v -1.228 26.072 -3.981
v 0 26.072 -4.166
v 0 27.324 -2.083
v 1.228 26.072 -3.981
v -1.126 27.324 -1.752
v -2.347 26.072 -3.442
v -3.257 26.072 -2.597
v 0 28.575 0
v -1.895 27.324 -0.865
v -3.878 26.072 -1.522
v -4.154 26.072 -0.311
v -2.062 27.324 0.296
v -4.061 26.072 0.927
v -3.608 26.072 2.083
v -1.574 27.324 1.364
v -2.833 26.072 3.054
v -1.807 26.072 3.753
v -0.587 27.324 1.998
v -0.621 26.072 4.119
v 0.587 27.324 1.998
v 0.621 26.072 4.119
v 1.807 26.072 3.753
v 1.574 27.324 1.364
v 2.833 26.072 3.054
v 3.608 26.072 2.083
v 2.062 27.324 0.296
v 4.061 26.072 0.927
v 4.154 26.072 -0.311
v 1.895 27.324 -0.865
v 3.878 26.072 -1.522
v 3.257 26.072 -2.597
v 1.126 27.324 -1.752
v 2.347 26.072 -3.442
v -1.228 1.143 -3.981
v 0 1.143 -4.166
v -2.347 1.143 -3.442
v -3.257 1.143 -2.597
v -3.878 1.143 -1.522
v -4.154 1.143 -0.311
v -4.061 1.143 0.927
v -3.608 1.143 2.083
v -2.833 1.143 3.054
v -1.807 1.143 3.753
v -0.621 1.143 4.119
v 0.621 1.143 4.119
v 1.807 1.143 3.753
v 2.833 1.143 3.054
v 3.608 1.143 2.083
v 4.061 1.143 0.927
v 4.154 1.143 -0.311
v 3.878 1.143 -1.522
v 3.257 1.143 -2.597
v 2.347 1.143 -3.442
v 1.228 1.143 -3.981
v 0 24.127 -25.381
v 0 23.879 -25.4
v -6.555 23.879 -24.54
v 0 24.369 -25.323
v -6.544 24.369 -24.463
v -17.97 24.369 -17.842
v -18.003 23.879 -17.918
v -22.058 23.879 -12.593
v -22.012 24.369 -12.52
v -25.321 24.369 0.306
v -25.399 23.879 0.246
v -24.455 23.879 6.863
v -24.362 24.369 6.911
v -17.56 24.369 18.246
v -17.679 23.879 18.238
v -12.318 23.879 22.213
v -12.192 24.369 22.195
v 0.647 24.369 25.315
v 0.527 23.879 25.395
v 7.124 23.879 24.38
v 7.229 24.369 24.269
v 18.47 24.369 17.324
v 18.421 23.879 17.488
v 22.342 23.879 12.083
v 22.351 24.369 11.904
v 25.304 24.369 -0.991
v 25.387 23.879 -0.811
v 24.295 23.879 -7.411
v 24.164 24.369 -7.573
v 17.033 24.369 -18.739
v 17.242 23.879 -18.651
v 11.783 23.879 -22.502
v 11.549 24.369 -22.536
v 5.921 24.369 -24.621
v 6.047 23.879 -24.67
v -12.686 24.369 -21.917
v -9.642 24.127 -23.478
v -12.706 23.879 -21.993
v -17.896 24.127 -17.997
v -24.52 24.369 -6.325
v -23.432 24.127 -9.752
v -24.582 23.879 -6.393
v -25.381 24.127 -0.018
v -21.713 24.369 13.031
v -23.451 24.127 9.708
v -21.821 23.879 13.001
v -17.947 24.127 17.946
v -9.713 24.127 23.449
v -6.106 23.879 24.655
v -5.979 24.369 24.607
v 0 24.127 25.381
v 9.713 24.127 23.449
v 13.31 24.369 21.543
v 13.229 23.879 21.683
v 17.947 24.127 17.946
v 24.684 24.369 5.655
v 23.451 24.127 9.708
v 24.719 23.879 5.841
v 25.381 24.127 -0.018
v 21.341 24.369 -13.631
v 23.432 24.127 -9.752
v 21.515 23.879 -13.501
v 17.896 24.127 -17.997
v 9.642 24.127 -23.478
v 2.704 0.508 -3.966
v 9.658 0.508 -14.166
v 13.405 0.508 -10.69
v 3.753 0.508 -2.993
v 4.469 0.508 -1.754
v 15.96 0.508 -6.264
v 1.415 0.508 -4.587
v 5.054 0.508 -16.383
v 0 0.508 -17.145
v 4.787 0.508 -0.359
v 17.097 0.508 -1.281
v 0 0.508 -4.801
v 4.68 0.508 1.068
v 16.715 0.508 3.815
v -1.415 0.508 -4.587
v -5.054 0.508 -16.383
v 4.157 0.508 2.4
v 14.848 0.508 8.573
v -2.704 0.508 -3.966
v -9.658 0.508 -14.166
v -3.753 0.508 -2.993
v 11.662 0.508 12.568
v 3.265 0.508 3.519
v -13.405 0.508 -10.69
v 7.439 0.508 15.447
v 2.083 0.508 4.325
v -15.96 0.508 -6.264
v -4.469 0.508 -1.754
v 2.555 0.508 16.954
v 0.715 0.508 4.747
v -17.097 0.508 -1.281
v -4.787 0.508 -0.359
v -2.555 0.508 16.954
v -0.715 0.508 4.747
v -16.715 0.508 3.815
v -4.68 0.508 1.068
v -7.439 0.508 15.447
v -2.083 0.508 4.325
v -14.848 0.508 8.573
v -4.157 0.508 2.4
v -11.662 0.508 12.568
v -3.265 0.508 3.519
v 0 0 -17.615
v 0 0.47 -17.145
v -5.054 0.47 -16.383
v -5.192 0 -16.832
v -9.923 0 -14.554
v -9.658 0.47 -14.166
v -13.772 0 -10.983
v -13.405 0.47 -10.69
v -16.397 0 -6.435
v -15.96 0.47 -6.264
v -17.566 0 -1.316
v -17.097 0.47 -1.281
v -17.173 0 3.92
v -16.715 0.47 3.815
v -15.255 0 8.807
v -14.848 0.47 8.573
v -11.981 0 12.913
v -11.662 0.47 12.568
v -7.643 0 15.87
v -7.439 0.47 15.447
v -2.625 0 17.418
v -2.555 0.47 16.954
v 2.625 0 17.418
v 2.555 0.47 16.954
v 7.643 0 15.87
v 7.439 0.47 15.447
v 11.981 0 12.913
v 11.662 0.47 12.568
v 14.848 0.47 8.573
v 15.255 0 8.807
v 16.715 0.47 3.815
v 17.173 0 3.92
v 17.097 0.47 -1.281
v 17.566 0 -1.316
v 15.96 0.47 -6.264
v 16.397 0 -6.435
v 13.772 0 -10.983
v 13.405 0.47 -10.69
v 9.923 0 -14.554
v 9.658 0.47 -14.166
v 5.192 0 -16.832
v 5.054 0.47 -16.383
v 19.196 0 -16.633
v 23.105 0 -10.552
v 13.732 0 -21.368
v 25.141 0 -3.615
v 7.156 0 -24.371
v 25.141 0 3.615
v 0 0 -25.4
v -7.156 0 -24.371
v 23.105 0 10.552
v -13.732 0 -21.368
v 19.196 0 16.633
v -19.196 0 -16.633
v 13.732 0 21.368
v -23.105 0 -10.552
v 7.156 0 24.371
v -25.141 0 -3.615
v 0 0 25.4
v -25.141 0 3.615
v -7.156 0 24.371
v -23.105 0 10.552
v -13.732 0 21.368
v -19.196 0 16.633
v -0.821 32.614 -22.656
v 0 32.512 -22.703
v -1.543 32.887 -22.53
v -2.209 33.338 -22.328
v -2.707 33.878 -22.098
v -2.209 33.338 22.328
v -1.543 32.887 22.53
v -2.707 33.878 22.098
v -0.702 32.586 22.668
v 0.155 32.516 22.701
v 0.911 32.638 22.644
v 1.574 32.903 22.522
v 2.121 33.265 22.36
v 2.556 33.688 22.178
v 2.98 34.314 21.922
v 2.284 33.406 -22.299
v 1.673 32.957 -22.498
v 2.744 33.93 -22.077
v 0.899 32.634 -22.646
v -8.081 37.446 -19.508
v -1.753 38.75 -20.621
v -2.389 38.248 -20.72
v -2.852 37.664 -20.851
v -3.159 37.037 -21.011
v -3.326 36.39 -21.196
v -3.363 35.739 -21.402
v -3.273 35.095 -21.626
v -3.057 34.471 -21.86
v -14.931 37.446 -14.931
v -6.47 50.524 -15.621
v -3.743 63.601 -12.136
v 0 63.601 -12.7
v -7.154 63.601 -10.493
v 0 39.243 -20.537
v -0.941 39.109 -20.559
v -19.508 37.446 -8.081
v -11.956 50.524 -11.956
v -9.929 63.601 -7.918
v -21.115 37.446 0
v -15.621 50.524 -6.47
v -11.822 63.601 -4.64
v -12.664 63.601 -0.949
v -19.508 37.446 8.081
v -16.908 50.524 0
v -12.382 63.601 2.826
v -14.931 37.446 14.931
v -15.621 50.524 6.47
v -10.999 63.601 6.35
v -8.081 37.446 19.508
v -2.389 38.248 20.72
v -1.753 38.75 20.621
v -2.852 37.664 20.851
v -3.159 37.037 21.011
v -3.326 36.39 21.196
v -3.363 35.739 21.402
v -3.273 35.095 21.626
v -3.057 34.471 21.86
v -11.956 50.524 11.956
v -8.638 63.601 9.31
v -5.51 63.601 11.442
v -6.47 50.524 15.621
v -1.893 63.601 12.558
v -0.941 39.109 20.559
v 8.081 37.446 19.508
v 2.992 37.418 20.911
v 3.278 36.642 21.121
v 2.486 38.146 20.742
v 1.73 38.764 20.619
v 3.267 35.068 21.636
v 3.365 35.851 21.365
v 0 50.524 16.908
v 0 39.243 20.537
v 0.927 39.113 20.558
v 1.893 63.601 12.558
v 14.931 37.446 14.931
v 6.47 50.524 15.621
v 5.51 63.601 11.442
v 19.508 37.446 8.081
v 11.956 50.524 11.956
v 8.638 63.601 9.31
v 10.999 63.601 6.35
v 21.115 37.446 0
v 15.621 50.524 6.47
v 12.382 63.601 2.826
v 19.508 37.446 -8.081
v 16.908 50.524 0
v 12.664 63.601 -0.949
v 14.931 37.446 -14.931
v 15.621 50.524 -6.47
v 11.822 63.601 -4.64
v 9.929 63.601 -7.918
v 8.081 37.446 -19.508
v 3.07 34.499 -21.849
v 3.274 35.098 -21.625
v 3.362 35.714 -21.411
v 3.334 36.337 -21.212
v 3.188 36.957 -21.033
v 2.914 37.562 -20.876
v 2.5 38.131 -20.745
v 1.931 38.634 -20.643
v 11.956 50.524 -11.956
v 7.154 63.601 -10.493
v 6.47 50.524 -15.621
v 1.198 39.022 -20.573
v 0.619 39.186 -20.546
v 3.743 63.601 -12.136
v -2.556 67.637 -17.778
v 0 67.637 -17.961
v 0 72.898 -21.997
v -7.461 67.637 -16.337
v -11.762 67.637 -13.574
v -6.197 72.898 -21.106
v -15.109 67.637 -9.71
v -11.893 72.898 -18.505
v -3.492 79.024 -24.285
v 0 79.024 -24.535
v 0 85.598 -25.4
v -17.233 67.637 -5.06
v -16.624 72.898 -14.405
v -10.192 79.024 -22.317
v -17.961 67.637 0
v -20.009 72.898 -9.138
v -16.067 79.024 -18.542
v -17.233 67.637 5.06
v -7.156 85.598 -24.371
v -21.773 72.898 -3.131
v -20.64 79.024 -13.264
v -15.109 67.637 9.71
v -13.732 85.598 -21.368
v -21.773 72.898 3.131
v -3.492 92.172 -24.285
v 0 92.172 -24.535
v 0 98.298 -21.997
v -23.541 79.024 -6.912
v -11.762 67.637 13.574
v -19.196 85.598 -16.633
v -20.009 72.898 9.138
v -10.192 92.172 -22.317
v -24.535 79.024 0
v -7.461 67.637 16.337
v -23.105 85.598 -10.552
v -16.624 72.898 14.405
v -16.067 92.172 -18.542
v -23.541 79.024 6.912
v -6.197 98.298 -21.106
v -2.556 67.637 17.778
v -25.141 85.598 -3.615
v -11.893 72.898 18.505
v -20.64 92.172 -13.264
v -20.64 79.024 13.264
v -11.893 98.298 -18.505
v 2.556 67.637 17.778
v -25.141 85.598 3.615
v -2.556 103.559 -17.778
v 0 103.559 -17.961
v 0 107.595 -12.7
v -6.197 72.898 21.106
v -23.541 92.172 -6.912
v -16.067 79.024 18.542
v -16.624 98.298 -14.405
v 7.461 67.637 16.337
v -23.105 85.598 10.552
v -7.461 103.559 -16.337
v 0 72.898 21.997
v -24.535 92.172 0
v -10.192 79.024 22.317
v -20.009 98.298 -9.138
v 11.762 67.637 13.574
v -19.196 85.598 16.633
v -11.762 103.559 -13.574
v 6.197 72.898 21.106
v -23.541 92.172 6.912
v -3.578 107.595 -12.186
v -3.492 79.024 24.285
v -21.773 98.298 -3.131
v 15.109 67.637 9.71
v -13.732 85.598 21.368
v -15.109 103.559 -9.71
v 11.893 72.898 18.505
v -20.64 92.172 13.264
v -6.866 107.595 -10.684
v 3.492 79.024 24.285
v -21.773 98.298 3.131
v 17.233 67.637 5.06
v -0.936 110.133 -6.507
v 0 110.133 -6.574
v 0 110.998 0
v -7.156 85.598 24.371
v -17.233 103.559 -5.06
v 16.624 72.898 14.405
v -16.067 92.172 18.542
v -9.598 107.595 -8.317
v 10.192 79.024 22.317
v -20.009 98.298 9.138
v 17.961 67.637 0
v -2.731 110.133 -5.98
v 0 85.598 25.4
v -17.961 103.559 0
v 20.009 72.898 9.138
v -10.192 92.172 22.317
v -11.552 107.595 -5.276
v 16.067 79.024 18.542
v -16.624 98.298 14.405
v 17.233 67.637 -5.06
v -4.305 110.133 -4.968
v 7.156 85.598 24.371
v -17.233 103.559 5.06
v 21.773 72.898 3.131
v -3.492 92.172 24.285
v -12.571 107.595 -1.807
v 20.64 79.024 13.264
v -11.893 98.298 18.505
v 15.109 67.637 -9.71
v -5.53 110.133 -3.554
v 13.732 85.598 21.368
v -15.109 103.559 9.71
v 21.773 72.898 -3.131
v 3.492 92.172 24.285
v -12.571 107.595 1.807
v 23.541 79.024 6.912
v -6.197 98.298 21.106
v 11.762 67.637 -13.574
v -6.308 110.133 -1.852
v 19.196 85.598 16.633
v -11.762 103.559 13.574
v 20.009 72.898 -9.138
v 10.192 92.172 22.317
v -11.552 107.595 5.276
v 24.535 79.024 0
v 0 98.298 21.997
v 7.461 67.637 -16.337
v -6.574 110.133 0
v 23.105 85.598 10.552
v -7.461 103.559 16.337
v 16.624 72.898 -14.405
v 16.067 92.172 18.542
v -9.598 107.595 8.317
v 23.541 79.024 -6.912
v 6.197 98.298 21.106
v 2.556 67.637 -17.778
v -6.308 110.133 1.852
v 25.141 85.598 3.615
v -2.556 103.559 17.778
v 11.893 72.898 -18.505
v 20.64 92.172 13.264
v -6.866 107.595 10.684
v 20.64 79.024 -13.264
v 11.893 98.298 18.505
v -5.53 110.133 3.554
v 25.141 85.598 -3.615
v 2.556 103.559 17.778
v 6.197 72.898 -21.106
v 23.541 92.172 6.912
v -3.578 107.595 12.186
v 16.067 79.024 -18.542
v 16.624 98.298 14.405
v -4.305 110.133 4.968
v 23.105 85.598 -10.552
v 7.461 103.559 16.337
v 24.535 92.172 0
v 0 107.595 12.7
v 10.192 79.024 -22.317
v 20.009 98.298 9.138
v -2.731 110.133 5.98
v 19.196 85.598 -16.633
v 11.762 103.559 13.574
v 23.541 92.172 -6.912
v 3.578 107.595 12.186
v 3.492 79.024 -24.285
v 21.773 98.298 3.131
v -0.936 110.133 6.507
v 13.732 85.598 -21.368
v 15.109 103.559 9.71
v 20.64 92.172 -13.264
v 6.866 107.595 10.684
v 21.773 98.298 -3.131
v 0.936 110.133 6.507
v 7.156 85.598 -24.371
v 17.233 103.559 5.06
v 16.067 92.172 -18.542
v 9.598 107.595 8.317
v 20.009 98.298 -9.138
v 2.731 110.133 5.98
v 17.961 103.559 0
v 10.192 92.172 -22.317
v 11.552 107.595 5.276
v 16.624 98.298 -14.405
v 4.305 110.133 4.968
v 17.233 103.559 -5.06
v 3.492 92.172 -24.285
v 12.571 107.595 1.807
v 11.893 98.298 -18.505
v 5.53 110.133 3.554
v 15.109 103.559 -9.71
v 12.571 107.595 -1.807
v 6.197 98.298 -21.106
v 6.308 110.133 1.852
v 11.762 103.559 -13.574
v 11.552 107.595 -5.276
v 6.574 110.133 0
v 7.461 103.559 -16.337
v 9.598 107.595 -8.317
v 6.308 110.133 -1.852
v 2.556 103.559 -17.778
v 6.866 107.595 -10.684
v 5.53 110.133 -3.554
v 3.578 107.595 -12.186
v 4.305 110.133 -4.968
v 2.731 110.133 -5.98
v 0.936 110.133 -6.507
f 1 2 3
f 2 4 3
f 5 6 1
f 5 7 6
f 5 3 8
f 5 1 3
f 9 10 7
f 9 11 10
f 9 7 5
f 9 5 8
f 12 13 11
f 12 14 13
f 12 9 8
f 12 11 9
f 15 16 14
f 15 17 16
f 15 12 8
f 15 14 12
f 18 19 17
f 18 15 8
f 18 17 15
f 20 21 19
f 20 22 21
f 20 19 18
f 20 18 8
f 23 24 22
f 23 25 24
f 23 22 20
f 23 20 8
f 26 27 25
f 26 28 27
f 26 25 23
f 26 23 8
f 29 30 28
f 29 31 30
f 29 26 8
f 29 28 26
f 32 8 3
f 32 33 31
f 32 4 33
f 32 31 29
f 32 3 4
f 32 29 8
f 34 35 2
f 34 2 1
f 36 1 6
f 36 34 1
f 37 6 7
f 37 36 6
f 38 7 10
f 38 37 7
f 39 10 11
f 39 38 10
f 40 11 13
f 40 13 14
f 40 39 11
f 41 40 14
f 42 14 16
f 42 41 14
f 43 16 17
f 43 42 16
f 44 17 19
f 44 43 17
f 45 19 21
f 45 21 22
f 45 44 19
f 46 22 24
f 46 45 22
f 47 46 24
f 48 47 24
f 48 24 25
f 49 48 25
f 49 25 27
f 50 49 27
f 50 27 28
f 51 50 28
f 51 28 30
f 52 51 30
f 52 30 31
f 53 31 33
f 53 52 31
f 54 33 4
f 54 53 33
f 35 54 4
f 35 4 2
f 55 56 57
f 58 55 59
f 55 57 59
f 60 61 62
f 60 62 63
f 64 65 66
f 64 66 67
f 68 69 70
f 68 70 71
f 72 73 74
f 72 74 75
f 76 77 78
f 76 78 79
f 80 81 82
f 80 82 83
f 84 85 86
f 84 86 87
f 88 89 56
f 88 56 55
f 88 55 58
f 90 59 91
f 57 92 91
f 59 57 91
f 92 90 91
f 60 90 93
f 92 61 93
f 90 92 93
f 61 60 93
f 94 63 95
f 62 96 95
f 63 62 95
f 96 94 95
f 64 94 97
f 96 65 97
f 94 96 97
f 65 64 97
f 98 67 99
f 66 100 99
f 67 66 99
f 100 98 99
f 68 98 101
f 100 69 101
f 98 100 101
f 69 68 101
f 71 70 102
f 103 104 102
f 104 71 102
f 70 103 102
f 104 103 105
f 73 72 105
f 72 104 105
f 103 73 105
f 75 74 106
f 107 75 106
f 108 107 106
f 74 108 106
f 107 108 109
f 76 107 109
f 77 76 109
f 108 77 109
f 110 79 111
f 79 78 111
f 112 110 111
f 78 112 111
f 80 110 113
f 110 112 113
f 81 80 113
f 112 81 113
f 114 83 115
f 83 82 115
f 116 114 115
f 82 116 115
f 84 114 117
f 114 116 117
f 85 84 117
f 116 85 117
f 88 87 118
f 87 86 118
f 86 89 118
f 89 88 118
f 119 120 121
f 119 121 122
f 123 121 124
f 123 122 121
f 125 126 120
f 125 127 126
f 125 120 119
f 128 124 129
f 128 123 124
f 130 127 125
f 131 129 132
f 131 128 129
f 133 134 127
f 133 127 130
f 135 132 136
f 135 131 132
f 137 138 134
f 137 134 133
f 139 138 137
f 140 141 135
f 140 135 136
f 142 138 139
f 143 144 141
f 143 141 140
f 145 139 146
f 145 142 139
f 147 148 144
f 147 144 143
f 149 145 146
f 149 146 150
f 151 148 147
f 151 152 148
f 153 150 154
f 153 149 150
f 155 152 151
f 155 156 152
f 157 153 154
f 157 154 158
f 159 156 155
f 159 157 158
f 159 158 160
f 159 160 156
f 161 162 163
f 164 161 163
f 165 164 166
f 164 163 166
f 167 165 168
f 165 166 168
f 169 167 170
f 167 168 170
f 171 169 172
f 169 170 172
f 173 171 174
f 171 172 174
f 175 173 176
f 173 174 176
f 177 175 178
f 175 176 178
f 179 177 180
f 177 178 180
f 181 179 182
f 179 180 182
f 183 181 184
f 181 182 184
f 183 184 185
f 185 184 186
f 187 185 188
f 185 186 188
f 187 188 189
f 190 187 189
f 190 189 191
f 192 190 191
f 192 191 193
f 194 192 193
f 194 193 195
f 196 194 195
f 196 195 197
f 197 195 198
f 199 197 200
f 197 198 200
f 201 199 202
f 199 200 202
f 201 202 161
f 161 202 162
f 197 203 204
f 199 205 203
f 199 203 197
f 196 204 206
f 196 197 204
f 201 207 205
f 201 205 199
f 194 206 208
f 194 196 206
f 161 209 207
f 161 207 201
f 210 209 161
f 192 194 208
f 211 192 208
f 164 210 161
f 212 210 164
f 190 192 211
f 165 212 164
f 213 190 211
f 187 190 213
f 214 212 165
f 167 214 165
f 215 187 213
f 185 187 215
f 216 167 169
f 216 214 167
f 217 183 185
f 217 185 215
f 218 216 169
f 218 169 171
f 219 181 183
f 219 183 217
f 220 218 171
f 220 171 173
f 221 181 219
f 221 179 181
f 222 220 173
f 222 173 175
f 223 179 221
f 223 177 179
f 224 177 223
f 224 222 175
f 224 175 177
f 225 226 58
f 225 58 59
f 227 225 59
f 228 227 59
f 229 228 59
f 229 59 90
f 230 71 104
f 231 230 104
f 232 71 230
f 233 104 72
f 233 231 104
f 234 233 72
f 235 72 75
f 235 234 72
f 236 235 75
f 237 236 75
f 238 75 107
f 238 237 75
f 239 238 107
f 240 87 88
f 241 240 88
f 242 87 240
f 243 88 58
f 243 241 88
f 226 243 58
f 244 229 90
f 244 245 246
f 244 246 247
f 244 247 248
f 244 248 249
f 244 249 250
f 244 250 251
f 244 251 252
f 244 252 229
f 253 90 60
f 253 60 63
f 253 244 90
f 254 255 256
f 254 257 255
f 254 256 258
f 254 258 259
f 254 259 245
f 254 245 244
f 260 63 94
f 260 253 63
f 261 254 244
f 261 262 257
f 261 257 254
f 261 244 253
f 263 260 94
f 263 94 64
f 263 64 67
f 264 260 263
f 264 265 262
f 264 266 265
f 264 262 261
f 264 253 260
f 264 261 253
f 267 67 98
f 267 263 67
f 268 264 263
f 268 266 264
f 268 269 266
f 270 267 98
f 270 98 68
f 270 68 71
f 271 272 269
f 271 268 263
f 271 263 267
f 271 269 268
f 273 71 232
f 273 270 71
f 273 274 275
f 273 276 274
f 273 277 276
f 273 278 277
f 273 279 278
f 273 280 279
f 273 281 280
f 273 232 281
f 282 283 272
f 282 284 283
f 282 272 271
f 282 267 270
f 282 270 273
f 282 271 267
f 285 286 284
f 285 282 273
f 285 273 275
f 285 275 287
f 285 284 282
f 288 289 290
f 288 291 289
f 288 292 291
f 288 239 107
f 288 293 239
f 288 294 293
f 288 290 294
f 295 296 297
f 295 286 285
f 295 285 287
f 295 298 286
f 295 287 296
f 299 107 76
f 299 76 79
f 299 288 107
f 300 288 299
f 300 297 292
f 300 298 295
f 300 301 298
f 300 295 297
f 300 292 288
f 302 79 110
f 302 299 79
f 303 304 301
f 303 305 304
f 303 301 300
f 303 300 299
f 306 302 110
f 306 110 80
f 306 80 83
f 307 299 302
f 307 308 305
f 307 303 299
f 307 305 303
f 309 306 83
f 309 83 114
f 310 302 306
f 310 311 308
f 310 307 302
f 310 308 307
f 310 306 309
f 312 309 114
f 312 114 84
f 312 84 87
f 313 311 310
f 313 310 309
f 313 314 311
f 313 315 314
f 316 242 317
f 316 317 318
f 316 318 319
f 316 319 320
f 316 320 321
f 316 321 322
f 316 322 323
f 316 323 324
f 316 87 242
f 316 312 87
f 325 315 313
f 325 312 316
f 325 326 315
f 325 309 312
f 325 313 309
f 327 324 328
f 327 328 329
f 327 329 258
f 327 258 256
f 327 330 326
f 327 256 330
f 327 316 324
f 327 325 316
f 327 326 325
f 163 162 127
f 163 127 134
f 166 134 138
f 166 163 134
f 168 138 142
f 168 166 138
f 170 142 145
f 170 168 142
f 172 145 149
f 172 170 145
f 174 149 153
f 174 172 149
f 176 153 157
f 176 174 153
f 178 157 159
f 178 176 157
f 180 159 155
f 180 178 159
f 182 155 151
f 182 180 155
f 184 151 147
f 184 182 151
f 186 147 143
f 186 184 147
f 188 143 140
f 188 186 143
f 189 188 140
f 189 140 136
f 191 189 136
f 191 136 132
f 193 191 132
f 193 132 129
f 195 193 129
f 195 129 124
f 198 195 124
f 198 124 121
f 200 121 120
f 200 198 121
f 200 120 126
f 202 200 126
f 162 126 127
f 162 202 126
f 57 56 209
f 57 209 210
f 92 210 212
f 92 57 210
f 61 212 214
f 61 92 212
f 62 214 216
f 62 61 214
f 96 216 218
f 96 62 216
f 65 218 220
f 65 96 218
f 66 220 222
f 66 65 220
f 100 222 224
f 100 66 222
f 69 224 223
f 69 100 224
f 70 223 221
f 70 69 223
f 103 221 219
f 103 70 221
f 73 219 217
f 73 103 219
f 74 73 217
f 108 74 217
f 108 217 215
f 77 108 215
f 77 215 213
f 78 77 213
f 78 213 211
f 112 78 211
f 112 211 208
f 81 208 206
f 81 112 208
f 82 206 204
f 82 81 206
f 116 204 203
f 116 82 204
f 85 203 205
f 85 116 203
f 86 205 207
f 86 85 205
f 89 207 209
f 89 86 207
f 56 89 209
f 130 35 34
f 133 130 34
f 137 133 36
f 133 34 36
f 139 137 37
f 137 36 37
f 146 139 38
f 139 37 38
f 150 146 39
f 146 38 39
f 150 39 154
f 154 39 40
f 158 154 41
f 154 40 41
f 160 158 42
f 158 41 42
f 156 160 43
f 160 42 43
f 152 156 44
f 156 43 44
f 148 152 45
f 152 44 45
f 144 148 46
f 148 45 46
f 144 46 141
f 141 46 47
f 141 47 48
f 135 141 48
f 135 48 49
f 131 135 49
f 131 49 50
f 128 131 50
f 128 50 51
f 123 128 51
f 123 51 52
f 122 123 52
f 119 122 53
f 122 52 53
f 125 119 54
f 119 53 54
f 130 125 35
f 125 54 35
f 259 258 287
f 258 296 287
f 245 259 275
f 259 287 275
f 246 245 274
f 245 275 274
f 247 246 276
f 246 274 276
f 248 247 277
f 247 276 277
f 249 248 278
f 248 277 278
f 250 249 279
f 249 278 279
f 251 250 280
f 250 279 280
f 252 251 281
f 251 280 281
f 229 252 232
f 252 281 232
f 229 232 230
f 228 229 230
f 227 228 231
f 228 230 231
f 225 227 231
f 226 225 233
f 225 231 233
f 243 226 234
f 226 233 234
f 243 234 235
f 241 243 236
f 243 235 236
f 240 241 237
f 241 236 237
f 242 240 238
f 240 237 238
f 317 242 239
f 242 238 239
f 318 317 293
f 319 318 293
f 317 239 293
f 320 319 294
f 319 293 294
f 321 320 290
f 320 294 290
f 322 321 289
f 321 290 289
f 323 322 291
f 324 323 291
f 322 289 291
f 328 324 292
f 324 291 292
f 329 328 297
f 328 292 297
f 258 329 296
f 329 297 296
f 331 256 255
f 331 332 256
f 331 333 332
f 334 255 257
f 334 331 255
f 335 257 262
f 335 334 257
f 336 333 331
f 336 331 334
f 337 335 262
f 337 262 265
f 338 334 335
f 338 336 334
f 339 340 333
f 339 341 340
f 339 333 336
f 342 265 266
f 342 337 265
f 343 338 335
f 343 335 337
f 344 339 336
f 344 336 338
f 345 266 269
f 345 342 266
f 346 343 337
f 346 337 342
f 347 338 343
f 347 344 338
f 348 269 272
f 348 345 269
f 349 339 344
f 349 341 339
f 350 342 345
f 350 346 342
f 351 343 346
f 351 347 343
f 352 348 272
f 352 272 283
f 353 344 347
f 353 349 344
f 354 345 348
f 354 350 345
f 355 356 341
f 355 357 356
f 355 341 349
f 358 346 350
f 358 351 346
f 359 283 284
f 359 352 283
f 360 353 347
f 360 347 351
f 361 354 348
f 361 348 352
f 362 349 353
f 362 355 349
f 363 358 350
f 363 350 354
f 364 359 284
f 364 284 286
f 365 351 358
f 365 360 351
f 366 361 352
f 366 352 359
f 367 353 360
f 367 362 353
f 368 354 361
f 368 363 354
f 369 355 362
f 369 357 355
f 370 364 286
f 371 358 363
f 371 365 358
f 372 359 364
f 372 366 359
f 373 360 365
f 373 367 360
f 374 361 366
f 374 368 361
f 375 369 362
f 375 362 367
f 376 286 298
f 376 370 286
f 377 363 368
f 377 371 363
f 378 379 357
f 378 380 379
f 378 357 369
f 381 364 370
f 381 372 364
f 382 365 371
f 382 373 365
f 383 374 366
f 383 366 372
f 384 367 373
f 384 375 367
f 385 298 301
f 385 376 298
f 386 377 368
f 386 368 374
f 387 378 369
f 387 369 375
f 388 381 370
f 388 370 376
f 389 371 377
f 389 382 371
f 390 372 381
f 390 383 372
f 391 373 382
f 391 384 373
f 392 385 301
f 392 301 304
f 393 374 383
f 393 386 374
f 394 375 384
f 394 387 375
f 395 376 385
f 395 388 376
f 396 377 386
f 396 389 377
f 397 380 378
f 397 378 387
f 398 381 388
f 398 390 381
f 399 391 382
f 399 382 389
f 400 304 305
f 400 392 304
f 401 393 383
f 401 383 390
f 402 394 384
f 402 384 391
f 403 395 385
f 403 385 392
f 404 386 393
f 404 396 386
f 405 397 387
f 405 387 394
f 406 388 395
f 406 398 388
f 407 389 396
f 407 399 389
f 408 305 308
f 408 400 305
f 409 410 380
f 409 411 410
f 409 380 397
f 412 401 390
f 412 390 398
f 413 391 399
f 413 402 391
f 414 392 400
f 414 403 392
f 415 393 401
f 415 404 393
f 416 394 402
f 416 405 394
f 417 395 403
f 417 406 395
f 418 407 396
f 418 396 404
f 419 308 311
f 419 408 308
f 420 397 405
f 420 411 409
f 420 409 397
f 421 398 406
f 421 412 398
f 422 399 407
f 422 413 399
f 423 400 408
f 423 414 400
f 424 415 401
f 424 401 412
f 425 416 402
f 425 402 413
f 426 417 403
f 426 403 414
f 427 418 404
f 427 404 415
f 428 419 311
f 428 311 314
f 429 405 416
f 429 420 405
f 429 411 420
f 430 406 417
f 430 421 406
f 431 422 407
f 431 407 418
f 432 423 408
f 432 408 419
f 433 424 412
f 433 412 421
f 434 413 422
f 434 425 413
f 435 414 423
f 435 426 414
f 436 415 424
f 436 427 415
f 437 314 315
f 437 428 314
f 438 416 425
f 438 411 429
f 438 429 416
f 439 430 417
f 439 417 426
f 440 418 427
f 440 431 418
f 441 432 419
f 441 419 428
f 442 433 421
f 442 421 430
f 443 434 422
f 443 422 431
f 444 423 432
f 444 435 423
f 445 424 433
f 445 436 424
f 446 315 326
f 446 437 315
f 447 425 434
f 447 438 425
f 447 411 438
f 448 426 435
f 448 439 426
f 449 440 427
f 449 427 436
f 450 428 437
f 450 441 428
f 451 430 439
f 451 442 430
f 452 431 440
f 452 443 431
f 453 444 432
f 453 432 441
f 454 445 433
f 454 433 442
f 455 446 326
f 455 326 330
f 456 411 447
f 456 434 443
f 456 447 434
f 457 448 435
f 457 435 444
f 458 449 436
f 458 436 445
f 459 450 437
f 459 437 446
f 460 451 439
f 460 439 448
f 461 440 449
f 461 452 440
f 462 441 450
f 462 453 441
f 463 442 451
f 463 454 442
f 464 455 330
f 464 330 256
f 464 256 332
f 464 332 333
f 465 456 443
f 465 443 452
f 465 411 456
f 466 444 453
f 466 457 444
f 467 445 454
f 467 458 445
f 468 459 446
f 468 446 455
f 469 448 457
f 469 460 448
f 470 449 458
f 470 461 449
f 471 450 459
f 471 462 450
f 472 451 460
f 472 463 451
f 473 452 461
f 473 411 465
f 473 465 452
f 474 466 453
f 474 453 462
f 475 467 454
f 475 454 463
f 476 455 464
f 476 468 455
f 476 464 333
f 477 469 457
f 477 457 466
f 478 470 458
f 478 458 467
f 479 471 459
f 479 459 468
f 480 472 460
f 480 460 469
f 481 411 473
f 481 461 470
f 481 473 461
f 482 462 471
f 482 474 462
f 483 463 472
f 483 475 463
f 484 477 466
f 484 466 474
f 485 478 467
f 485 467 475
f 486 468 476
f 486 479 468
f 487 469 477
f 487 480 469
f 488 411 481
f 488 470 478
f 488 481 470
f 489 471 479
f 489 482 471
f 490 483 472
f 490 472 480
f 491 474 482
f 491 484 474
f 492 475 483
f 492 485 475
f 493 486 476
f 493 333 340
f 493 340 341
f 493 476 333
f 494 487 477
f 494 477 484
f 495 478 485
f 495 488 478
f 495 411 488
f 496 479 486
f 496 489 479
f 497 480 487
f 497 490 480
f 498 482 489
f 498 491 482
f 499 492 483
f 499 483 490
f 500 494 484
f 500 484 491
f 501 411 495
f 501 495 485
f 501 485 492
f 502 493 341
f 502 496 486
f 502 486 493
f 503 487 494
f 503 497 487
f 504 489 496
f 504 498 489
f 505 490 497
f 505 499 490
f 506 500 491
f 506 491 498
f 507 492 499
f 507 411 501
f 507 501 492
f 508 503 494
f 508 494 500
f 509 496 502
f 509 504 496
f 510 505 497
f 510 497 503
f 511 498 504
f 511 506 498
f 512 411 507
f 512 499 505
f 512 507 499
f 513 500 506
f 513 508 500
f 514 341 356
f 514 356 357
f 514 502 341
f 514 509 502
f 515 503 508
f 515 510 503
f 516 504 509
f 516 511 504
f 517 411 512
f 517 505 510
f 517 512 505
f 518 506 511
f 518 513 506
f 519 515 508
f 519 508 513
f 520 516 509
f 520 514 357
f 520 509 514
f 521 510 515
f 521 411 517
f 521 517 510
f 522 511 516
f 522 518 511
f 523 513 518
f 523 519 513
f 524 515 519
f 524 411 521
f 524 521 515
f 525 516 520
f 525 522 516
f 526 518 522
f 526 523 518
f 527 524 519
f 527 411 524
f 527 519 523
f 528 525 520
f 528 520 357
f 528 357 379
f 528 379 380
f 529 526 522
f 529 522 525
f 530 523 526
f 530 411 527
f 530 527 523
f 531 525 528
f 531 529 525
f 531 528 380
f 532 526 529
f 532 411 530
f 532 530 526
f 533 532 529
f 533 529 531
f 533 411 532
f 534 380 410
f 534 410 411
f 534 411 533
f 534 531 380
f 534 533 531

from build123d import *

# Parameters (mm, degrees)
SKETCH2_R               = 3.3655
CUT_EXTRUDE1_DEPTH      = 26.4
CUT_EXTRUDE1_DEPTH_BACK = 26.4
FILLET1_R               = 1.6002
CHAMFER1_SIZE           = 0.4699
CHAMFER2_SIZE           = 0.635


with BuildPart() as part:
    # Sketch1 → Revolve1 (revolve)
    with BuildSketch(Plane.XY, mode=Mode.PRIVATE) as revolve1_sk:
        with BuildLine():
            Line((25.4, 0), (25.4, 24.13))
            Line((25.4, 24.13), (12.7, 63.600954744))
            ThreePointArc((12.7, 63.600954744), (24.534515988, 92.172003746), (0, 110.998))
            Line((0, 110.998), (0, 28.575))
            Line((0, 28.575), (4.1656, 26.072055005))
            Line((4.1656, 26.072055005), (4.1656, 0.508))
            Line((4.1656, 0.508), (17.145, 0.508))
            Line((17.145, 0.508), (17.145, 0))
            Line((17.145, 0), (25.4, 0))
        make_face()
    revolve(revolve1_sk.sketch.rotate(Axis((0, 0, 0), (0, 1, 0)), 90), axis=Axis((0, 0, 0), (0, 1, 0)))  # turned: the seam where the file's is

    # Sketch2 → Cut-Extrude1 (cut, two sides)
    with BuildSketch(Plane.XY) as cut_extrude1_sk:
        with Locations(Location((0, 35.8775, 0), (0, 0, 90.000000009))):  # turned: the seam where the file's is
            Circle(SKETCH2_R)
    extrude(amount=CUT_EXTRUDE1_DEPTH, mode=Mode.SUBTRACT)
    extrude(cut_extrude1_sk.sketch, amount=-CUT_EXTRUDE1_DEPTH_BACK, mode=Mode.SUBTRACT)

    # Fillet1
    fillet1_edges = [part.edges().sort_by_distance(p)[0] for p in [
        (0, 24.13, 25.4),
    ]]
    fillet(fillet1_edges, radius=FILLET1_R)

    # Chamfer1
    chamfer1_edges = [part.edges().sort_by_distance(p)[0] for p in [
        (0, 0, 17.145),
    ]]
    chamfer(chamfer1_edges, length=CHAMFER1_SIZE)

    # Chamfer2
    chamfer2_edges = [part.edges().sort_by_distance(p)[0] for p in [
        (0, 0.508, 4.1656),
    ]]
    chamfer(chamfer2_edges, length=CHAMFER2_SIZE)


solid = part.part
